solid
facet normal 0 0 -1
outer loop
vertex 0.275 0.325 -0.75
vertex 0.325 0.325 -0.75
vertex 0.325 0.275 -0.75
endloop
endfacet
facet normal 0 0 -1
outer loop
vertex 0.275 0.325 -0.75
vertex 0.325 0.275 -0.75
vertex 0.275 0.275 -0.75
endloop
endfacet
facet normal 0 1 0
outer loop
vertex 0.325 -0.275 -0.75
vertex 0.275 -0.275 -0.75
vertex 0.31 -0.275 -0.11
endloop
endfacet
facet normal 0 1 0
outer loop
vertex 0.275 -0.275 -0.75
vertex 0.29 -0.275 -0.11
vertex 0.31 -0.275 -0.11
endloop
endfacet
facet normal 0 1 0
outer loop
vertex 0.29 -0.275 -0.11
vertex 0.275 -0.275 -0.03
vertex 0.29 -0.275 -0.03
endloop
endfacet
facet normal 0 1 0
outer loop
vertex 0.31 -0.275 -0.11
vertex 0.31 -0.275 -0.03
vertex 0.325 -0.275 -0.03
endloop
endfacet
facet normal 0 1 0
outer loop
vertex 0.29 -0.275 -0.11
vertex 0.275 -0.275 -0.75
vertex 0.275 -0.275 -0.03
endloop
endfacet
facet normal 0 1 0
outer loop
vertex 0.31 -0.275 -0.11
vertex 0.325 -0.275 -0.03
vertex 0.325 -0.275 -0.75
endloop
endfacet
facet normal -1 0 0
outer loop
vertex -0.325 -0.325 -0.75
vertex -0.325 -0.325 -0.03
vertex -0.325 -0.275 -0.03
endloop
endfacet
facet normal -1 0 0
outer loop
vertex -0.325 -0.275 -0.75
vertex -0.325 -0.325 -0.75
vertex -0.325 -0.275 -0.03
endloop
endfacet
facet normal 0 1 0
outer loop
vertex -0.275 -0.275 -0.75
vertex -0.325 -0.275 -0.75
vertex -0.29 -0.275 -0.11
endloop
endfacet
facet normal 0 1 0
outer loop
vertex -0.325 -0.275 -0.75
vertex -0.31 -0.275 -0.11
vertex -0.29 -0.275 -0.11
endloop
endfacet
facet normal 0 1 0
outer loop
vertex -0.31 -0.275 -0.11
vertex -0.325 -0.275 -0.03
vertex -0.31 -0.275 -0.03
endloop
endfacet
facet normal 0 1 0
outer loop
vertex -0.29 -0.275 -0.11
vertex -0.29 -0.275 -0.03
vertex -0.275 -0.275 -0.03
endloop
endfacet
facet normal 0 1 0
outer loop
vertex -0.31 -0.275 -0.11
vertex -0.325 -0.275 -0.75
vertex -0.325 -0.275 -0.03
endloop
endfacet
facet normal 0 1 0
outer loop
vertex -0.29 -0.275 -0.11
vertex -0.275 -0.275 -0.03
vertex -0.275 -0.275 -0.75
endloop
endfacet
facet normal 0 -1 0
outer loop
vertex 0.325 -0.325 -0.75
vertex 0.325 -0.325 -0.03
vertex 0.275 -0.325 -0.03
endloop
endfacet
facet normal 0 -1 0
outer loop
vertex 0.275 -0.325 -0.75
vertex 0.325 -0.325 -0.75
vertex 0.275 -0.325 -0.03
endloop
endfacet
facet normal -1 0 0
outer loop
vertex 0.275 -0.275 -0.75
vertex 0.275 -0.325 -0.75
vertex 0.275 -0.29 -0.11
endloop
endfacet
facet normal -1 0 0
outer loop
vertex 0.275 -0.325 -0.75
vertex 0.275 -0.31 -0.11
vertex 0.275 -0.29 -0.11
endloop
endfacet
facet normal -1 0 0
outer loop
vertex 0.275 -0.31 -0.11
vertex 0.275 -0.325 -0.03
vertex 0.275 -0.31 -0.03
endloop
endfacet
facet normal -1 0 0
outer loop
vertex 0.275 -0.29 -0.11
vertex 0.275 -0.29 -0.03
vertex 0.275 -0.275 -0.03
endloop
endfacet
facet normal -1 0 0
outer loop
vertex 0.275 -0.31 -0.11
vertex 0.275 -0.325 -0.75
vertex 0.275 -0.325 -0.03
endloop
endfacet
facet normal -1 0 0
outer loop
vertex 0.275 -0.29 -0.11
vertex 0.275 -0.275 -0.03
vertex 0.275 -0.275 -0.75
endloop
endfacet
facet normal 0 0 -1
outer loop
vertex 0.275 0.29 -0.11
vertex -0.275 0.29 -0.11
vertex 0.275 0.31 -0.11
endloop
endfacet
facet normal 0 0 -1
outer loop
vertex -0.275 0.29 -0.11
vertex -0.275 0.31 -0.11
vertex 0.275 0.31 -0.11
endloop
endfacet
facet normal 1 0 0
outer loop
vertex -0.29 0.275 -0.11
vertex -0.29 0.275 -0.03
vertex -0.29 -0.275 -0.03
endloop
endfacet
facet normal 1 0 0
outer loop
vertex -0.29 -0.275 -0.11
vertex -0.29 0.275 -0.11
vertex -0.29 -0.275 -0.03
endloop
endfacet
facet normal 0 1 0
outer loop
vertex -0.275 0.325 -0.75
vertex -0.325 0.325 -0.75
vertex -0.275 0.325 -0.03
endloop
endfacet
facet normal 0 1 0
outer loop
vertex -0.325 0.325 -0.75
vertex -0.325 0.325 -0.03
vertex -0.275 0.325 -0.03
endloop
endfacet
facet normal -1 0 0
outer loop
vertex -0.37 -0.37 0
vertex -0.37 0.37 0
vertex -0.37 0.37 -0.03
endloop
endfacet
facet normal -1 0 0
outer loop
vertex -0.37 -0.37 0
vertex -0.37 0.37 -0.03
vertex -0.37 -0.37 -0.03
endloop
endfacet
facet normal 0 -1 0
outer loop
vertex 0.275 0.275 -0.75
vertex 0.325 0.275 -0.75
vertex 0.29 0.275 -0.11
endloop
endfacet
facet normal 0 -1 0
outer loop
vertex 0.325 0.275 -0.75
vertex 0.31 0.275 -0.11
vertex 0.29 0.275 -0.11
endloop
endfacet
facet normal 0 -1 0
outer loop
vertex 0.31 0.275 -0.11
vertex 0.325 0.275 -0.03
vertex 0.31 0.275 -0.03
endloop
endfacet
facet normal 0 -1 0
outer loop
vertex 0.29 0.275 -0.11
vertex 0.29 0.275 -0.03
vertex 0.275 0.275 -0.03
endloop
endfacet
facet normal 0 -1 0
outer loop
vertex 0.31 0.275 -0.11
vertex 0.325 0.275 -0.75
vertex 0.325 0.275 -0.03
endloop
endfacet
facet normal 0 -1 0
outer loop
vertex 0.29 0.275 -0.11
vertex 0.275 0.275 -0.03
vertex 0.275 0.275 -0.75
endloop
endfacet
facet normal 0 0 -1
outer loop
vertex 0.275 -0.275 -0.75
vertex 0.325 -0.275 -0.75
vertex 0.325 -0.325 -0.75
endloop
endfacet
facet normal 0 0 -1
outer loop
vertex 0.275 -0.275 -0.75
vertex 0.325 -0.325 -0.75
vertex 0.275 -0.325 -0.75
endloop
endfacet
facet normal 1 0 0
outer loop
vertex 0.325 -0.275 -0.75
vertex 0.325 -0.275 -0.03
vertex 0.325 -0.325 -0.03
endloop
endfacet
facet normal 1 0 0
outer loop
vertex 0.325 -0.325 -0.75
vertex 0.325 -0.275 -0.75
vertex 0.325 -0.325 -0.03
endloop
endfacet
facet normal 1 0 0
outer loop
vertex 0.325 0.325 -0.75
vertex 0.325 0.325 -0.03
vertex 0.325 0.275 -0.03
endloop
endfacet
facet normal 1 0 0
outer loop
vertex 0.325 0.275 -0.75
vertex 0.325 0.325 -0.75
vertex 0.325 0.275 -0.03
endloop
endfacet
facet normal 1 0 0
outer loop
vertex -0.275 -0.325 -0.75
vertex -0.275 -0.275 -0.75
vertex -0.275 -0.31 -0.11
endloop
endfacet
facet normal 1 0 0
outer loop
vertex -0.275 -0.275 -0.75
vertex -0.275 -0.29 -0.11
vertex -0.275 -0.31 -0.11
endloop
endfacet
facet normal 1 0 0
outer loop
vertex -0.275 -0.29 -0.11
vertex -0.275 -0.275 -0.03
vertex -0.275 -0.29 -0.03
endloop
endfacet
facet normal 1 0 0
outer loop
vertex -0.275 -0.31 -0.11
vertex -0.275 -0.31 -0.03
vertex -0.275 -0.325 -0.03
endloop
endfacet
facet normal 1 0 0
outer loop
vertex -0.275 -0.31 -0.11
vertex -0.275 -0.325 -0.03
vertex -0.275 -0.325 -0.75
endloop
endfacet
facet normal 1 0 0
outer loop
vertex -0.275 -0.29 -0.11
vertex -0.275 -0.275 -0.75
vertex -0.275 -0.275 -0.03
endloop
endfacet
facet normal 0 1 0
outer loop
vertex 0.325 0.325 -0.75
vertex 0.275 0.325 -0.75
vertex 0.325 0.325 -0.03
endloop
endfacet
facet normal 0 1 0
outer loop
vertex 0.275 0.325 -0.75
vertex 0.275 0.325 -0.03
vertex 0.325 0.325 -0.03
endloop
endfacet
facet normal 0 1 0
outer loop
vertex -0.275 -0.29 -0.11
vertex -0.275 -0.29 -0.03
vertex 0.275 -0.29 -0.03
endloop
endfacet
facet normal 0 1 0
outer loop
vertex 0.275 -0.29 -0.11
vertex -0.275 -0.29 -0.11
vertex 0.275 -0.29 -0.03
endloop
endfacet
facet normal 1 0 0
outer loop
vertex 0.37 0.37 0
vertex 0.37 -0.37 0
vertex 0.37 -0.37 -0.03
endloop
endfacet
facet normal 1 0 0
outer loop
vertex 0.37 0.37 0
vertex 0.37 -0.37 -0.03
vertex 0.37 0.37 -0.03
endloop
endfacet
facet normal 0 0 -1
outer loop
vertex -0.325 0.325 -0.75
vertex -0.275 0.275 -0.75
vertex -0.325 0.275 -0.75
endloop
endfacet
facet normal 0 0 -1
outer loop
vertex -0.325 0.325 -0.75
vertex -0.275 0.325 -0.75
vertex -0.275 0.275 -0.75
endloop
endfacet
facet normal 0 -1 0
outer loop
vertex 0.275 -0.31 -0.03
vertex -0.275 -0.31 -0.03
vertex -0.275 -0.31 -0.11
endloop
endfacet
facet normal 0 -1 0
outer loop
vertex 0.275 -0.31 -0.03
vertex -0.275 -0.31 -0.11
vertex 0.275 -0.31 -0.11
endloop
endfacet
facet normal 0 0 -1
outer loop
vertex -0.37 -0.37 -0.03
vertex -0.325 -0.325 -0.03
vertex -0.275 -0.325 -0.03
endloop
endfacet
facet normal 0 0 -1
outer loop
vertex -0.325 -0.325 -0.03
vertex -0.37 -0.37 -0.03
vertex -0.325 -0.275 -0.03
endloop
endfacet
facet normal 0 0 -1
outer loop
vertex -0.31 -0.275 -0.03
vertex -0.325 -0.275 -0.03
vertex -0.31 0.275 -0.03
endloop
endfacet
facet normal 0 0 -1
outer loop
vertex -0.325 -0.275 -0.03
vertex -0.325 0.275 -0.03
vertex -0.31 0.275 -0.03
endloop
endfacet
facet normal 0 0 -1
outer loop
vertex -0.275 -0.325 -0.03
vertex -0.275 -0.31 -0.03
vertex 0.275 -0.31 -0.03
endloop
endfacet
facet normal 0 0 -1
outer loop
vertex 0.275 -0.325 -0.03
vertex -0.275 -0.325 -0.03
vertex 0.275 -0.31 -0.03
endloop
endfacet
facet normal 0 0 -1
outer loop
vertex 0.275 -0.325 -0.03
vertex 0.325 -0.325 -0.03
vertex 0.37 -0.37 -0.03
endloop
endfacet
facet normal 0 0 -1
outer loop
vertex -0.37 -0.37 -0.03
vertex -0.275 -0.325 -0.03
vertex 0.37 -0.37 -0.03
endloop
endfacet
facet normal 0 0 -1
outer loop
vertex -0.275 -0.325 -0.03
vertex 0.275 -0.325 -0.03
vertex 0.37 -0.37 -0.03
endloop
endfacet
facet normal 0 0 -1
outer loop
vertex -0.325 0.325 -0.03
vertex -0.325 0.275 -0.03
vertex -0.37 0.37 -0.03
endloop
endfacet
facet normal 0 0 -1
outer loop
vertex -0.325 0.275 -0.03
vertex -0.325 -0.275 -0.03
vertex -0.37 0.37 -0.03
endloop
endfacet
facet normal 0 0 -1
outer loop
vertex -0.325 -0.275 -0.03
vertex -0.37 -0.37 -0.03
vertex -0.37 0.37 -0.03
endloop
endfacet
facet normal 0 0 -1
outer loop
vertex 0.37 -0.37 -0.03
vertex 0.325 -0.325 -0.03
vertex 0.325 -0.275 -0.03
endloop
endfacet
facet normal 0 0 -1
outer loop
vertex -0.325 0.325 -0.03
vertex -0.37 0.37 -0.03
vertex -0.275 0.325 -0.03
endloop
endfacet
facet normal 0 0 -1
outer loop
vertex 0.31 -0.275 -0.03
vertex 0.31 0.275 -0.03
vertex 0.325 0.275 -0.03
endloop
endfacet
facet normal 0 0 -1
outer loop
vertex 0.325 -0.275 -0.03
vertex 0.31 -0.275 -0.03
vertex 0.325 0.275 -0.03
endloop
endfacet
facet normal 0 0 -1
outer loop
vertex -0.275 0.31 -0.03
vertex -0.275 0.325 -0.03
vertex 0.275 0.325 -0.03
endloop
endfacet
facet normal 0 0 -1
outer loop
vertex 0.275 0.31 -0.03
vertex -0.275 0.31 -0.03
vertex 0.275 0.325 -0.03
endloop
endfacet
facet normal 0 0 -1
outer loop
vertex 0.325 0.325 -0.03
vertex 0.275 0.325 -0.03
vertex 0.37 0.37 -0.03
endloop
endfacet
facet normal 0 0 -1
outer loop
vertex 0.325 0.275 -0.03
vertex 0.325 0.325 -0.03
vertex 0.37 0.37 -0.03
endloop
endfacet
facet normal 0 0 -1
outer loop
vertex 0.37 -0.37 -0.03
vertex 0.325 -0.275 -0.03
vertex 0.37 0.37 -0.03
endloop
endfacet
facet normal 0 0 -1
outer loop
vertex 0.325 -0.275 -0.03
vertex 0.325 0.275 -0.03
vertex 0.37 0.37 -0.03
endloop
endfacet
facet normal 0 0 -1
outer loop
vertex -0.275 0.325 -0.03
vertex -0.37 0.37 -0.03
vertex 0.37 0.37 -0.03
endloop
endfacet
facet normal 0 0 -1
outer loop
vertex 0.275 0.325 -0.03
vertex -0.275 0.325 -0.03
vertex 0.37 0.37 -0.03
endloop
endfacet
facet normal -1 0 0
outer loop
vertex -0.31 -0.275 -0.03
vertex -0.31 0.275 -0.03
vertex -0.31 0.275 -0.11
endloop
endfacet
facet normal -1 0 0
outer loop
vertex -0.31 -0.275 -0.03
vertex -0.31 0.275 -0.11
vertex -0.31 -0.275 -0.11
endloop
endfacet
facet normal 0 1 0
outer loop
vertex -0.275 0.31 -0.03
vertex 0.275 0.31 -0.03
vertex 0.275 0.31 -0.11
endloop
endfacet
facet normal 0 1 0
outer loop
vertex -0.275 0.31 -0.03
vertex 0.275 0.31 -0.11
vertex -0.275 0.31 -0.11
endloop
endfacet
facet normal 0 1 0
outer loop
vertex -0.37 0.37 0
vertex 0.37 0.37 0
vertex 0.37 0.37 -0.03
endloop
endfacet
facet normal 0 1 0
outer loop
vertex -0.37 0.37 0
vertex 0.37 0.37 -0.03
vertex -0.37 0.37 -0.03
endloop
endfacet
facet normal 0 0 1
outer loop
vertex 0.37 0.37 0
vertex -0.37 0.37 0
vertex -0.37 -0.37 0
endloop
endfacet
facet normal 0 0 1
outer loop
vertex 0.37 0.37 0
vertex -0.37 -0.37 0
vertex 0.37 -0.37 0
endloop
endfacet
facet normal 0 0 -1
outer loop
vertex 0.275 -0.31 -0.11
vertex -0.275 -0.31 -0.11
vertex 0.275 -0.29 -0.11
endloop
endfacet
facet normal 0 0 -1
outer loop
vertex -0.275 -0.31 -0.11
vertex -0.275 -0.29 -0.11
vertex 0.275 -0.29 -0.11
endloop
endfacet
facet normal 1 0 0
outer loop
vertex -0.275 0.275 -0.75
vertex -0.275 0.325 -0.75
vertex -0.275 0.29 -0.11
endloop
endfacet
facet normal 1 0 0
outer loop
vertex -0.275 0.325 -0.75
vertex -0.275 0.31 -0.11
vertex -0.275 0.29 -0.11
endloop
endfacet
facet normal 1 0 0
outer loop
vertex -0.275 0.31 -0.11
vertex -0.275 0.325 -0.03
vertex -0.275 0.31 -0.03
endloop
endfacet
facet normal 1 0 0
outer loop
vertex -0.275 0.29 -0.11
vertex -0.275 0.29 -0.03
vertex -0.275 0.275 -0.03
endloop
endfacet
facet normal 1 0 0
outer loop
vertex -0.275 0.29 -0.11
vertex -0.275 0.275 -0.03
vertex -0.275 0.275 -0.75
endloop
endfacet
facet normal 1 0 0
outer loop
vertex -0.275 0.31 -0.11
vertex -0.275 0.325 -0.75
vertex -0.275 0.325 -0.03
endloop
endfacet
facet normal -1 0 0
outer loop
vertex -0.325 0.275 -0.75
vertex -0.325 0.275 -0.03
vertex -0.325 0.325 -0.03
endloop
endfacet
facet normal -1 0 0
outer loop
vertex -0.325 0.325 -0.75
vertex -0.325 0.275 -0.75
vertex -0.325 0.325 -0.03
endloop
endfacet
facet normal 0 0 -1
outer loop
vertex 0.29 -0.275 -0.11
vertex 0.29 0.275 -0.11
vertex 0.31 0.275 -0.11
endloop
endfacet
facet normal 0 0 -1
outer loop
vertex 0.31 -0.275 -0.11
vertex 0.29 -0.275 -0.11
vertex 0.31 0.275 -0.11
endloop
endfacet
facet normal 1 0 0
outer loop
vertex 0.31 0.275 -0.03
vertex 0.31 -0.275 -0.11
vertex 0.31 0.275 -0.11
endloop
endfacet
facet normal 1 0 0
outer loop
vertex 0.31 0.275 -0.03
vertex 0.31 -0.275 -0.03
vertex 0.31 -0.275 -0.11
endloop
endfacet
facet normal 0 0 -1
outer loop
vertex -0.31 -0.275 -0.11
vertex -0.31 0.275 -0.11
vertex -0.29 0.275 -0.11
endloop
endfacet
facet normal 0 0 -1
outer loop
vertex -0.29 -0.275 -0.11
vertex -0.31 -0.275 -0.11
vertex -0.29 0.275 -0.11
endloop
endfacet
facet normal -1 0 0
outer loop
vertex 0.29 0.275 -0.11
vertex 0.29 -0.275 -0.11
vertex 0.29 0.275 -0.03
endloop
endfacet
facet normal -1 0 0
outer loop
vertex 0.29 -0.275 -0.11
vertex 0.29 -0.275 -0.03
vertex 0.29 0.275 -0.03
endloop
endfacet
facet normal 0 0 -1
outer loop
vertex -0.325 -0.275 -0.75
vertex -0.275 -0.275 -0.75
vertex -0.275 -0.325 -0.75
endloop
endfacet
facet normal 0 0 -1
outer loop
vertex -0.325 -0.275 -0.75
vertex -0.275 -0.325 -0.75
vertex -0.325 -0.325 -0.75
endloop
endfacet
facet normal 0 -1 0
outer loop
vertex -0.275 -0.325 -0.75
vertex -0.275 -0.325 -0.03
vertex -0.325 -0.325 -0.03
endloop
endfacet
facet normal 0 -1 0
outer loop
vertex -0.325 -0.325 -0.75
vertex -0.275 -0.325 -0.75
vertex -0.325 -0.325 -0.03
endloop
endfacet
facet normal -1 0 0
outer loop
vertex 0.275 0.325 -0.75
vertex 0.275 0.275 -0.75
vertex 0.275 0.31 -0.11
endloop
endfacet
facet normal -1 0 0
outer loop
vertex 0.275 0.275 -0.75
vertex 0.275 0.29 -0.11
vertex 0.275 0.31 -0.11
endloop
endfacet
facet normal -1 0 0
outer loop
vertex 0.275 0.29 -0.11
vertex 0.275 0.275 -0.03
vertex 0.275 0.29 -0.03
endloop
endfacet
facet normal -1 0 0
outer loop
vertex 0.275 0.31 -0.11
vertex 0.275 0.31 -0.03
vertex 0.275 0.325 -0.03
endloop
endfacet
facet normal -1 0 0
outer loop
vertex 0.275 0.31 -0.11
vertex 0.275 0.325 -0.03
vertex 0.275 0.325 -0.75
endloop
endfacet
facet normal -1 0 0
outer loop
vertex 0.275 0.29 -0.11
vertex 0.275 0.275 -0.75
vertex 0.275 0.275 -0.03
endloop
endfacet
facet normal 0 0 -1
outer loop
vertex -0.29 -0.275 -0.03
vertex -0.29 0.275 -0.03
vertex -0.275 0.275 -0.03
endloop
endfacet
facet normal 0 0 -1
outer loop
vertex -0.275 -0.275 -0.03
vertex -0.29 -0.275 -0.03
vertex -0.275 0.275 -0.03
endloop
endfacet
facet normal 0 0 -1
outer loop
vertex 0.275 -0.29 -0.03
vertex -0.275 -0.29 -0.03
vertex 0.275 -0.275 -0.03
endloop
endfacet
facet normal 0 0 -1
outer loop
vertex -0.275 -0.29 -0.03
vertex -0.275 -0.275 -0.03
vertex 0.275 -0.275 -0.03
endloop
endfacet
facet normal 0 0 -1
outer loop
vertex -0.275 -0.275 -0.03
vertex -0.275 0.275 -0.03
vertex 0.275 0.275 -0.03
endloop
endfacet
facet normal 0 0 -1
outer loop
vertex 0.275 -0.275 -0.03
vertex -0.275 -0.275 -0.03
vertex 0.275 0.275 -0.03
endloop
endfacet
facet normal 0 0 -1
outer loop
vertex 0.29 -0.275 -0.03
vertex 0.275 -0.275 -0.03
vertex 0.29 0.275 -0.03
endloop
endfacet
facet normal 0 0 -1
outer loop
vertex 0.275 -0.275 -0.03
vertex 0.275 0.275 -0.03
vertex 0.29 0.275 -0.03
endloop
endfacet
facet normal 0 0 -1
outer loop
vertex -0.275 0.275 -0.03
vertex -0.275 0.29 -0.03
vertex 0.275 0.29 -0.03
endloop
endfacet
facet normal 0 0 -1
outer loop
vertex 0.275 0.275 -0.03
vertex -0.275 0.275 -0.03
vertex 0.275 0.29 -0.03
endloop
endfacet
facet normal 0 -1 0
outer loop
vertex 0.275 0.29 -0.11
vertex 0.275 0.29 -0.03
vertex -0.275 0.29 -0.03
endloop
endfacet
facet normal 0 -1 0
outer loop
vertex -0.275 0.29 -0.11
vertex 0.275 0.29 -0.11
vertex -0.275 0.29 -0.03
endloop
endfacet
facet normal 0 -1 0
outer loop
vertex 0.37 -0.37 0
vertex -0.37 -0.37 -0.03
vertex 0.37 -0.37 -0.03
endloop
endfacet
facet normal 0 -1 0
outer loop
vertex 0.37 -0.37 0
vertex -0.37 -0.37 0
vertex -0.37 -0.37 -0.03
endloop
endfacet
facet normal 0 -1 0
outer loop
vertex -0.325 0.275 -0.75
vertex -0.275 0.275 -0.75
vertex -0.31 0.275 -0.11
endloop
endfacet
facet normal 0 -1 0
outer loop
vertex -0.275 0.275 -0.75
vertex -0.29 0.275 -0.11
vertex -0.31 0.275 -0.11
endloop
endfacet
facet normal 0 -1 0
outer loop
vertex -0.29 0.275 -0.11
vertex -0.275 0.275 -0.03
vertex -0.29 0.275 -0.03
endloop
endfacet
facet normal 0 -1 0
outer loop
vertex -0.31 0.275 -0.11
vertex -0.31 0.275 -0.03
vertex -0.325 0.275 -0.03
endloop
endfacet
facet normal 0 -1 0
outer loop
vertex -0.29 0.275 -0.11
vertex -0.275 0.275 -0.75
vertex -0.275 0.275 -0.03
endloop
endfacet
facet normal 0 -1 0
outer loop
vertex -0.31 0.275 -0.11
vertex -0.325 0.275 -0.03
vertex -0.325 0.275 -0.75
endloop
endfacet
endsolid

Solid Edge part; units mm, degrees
sketch "Sketch1" plane through (0, 0, 0) normal (0, 0, 1) x (1, 0, 0)
  line L0 (-0.37, -0.37) -> (0.37, -0.37)
  line L1 (0.37, -0.37) -> (0.37, 0.37)
  line L2 (0.37, 0.37) -> (-0.37, 0.37)
  line L3 (-0.37, 0.37) -> (-0.37, -0.37)
  dimension "D1" = 0.74
extrude "Protrusion1" add sketch "Sketch1" against normal blind 0.03
sketch "Sketch2" plane through (0, 0, -0.03) normal (0, 0, -1) x (1, 0, 0)
  line L0 (-0.325, -0.325) -> (-0.275, -0.325)
  line L1 (-0.275, -0.325) -> (-0.275, -0.275)
  line L2 (-0.275, -0.275) -> (-0.325, -0.275)
  line L3 (-0.325, -0.275) -> (-0.325, -0.325)
  line L4 (0.275, -0.325) -> (0.325, -0.325)
  line L5 (0.325, -0.325) -> (0.325, -0.275)
  line L6 (0.325, -0.275) -> (0.275, -0.275)
  line L7 (0.275, -0.275) -> (0.275, -0.325)
  line L8 (0.275, 0.275) -> (0.325, 0.275)
  line L9 (0.325, 0.275) -> (0.325, 0.325)
  line L10 (0.325, 0.325) -> (0.275, 0.325)
  line L11 (0.275, 0.325) -> (0.275, 0.275)
  line L12 (-0.325, 0.275) -> (-0.275, 0.275)
  line L13 (-0.275, 0.275) -> (-0.275, 0.325)
  line L14 (-0.275, 0.325) -> (-0.325, 0.325)
  line L15 (-0.325, 0.325) -> (-0.325, 0.275)
  dimension "D1" = 0.05
  dimension "D2" = 0.6
extrude "Ausprägung_2" add sketch "Sketch2" along normal blind 0.72
sketch "Sketch3" plane through (0, 0, -0.03) normal (0, 0, -1) x (1, 0, 0)
  line L0 (-0.29, 0.29) -> (0.29, 0.29)
  line L1 (0.29, 0.29) -> (0.29, -0.29)
  line L2 (0.29, -0.29) -> (-0.29, -0.29)
  line L3 (-0.29, -0.29) -> (-0.29, 0.29)
  line L4 (-0.31, 0.31) -> (0.31, 0.31)
  line L5 (0.31, 0.31) -> (0.31, -0.31)
  line L6 (0.31, -0.31) -> (-0.31, -0.31)
  line L7 (-0.31, -0.31) -> (-0.31, 0.31)
extrude "Ausprägung_3" add sketch "Sketch3" along normal blind 0.08
